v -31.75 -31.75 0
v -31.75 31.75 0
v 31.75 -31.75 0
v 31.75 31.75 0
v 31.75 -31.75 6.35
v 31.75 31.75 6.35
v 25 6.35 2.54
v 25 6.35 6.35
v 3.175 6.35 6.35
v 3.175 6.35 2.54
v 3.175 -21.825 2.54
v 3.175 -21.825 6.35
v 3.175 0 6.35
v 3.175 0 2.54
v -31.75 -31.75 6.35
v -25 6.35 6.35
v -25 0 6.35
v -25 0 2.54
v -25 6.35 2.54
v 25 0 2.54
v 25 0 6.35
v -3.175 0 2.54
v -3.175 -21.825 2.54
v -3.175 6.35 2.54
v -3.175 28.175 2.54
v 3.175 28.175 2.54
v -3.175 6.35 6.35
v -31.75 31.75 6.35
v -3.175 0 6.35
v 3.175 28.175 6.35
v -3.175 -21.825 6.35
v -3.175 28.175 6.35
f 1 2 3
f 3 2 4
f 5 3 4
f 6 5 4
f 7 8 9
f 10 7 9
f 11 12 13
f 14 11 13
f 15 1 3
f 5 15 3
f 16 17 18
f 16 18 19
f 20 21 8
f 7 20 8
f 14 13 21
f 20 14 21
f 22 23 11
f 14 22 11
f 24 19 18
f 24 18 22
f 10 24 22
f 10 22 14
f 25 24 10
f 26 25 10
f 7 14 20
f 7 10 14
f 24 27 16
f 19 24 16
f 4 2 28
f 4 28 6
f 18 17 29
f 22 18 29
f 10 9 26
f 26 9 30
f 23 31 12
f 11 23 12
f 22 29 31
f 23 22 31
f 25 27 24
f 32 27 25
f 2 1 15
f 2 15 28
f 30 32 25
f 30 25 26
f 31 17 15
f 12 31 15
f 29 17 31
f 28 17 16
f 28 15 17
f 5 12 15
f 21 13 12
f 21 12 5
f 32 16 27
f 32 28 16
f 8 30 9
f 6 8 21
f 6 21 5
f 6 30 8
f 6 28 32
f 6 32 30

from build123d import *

# Parameters (mm, degrees)
F0_W     = 63.5
F0_H     = 63.5
F1_DEPTH = 6.35
F2_W     = 21.825
F2_H     = 6.35
F2_W_2   = 6.35
F2_H_2   = 21.825
F3_DEPTH = 3.81


with BuildPart() as f1:
    # F0 (on Top) → F1 (new body)
    with BuildSketch(Plane.XY):
        Rectangle(F0_W, F0_H)
    extrude(amount=F1_DEPTH)

    # F2 (on face) → F3 (cut)
    with BuildSketch(Plane.XY.offset(6.35)):
        with Locations((14.0875, 3.175)):
            Rectangle(F2_W, F2_H)
        with Locations((0, -10.9125)):
            Rectangle(F2_W_2, F2_H_2)
        with Locations((0, 3.175)):
            Rectangle(F2_W_2, F2_H)
        with Locations((-14.0875, 3.175)):
            Rectangle(F2_W, F2_H)
        with Locations((0, 17.2625)):
            Rectangle(F2_W_2, F2_H_2)
    extrude(amount=-F3_DEPTH, mode=Mode.SUBTRACT)


solid = f1.part
